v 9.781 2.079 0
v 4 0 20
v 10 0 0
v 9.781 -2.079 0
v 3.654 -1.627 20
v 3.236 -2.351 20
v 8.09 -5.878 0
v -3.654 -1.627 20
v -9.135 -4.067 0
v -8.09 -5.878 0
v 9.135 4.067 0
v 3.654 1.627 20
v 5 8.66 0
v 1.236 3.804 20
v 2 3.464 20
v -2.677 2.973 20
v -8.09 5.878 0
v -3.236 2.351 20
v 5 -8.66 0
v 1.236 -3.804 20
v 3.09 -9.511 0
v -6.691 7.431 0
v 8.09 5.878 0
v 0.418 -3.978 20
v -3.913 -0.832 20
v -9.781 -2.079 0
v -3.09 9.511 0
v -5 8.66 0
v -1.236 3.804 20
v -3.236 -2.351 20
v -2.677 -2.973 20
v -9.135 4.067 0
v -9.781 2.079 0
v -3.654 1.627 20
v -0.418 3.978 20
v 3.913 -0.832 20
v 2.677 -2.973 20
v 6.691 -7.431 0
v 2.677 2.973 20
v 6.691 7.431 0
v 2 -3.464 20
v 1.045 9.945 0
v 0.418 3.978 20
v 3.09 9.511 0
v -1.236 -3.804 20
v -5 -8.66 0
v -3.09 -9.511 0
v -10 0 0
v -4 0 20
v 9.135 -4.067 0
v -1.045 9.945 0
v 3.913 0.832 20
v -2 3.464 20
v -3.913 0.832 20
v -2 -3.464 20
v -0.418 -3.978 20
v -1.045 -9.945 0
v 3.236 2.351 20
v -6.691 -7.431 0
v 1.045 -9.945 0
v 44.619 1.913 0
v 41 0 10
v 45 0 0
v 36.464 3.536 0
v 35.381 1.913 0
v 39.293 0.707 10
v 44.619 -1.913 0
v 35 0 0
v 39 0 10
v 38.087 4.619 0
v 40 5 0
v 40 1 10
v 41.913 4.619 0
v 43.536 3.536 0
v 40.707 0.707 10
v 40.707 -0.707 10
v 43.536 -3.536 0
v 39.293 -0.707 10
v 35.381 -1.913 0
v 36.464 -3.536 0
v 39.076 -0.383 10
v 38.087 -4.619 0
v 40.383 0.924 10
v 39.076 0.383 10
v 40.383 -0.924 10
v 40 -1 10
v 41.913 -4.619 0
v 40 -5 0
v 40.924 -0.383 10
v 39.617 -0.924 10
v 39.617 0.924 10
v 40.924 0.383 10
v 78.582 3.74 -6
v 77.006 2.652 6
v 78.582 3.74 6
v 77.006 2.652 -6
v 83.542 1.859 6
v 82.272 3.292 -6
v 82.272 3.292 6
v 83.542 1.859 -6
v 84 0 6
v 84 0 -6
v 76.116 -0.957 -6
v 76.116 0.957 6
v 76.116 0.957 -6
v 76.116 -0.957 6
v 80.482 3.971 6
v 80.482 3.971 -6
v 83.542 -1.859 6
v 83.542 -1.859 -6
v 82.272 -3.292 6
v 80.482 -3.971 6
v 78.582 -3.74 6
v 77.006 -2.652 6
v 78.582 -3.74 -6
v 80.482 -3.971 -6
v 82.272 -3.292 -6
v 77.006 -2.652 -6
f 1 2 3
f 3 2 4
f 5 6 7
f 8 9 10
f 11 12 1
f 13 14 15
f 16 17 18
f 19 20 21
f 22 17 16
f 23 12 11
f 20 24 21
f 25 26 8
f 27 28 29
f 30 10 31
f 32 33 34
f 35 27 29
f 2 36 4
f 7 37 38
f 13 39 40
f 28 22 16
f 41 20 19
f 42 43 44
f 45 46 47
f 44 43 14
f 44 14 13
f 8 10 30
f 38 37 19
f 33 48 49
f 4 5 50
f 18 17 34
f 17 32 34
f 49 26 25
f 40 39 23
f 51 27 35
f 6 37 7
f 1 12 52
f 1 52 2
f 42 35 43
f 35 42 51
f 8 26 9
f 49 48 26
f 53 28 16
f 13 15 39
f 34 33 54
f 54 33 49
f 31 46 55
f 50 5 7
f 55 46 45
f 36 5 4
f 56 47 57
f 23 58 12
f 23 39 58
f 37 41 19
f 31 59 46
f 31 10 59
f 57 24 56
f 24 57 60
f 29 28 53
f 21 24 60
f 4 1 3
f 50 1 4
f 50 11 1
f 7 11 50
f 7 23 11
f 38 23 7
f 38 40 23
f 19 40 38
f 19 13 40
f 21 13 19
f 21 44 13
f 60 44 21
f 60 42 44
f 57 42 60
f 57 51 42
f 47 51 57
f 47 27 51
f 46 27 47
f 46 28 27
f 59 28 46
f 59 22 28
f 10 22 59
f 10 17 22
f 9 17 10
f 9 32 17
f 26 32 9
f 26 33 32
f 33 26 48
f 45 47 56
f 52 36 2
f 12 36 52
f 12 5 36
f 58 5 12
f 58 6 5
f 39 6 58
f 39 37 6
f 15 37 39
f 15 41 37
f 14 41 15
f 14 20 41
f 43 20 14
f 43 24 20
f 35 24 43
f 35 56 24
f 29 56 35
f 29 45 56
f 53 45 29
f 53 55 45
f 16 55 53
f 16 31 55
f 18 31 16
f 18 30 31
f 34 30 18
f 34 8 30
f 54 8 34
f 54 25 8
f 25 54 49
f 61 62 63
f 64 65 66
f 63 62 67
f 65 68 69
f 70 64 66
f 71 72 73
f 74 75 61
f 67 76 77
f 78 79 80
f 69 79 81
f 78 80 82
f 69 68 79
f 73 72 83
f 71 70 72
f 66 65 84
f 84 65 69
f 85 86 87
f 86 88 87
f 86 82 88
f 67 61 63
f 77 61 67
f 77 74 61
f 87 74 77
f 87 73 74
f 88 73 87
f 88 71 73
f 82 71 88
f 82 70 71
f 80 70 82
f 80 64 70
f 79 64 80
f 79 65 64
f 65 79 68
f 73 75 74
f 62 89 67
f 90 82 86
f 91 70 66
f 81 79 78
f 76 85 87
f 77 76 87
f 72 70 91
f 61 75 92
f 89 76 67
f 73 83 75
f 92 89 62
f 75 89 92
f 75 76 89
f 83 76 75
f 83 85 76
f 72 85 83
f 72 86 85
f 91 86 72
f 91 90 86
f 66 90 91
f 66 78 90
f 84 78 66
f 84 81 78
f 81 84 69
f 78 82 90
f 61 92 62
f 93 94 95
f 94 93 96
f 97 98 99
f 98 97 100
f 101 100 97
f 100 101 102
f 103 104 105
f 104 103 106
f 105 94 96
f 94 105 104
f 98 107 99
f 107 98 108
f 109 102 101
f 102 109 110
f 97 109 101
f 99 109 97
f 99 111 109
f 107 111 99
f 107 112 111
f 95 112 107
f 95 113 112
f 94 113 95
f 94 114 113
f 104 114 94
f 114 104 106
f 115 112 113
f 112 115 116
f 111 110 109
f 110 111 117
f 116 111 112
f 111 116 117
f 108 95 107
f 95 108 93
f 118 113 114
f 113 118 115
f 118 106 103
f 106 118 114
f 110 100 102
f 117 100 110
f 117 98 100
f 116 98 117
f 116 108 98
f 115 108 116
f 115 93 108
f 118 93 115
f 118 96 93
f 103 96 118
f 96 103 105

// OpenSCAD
// cylinder() with POSITIONAL arguments, which the rest of the corpus never used.
//
// WHAT IT WOULD CATCH. `scad.ts` resolves five separate things here and the
// corpus wrote none of them: the positional order `h, r1, r2, center`, the
// third positional (`pos[2]`) being reachable at all, the fourth (`center`)
// being read, and — the one an audit missed — that an UNSPECIFIED radius
// defaults to **1, not to the other radius**. `cylinder(10, 5)` is a cone in
// OpenSCAD (r1 5, r2 1) and was drawn here as a straight 5/5 cylinder.
//
// WHY IT WAS CHOSEN. Every cylinder in the corpus passed `r`/`r1`/`r2`/`d1`/`d2`
// BY NAME, so the whole positional path — the one a human writes by hand — had
// zero coverage while its comment in `scad.ts` documents five measured defects
// in it. A cone drawn as a cylinder is a countersink cut as a straight bore and
// a draft angle silently removed; `center` ignored puts the part h/2 off datum.
//
// ⚠ THE MIDDLE CHILD IS THE SHARP ONE. `cylinder(10, 5)` looks like a
// well-formed cylinder in the source and is a cone in the reference
// implementation. A reader checking this file will want to "fix" it; do not.
//
// Spacing is the decidability constraint, not a style: overlapping top-level
// solids make the mesh leg UNDECIDABLE and a PENDING corpus case FAILS CAD1.
// Radii are 10, 5 and 4 at x = 0, 40, 80, so no two bounding boxes can touch.
//
// PLANTED AND WATCHED RED (throwaway copy of the harness, openscad 2026.08.07):
//   · an unspecified r2 defaulting to r1        -> DIVERGES
//   · pos[3] (center) not read                  -> DIVERGES
cylinder(20, 10, 4);
translate([40, 0, 0]) cylinder(10, 5);
translate([80, 0, 0]) cylinder(12, 4, 4, true);
